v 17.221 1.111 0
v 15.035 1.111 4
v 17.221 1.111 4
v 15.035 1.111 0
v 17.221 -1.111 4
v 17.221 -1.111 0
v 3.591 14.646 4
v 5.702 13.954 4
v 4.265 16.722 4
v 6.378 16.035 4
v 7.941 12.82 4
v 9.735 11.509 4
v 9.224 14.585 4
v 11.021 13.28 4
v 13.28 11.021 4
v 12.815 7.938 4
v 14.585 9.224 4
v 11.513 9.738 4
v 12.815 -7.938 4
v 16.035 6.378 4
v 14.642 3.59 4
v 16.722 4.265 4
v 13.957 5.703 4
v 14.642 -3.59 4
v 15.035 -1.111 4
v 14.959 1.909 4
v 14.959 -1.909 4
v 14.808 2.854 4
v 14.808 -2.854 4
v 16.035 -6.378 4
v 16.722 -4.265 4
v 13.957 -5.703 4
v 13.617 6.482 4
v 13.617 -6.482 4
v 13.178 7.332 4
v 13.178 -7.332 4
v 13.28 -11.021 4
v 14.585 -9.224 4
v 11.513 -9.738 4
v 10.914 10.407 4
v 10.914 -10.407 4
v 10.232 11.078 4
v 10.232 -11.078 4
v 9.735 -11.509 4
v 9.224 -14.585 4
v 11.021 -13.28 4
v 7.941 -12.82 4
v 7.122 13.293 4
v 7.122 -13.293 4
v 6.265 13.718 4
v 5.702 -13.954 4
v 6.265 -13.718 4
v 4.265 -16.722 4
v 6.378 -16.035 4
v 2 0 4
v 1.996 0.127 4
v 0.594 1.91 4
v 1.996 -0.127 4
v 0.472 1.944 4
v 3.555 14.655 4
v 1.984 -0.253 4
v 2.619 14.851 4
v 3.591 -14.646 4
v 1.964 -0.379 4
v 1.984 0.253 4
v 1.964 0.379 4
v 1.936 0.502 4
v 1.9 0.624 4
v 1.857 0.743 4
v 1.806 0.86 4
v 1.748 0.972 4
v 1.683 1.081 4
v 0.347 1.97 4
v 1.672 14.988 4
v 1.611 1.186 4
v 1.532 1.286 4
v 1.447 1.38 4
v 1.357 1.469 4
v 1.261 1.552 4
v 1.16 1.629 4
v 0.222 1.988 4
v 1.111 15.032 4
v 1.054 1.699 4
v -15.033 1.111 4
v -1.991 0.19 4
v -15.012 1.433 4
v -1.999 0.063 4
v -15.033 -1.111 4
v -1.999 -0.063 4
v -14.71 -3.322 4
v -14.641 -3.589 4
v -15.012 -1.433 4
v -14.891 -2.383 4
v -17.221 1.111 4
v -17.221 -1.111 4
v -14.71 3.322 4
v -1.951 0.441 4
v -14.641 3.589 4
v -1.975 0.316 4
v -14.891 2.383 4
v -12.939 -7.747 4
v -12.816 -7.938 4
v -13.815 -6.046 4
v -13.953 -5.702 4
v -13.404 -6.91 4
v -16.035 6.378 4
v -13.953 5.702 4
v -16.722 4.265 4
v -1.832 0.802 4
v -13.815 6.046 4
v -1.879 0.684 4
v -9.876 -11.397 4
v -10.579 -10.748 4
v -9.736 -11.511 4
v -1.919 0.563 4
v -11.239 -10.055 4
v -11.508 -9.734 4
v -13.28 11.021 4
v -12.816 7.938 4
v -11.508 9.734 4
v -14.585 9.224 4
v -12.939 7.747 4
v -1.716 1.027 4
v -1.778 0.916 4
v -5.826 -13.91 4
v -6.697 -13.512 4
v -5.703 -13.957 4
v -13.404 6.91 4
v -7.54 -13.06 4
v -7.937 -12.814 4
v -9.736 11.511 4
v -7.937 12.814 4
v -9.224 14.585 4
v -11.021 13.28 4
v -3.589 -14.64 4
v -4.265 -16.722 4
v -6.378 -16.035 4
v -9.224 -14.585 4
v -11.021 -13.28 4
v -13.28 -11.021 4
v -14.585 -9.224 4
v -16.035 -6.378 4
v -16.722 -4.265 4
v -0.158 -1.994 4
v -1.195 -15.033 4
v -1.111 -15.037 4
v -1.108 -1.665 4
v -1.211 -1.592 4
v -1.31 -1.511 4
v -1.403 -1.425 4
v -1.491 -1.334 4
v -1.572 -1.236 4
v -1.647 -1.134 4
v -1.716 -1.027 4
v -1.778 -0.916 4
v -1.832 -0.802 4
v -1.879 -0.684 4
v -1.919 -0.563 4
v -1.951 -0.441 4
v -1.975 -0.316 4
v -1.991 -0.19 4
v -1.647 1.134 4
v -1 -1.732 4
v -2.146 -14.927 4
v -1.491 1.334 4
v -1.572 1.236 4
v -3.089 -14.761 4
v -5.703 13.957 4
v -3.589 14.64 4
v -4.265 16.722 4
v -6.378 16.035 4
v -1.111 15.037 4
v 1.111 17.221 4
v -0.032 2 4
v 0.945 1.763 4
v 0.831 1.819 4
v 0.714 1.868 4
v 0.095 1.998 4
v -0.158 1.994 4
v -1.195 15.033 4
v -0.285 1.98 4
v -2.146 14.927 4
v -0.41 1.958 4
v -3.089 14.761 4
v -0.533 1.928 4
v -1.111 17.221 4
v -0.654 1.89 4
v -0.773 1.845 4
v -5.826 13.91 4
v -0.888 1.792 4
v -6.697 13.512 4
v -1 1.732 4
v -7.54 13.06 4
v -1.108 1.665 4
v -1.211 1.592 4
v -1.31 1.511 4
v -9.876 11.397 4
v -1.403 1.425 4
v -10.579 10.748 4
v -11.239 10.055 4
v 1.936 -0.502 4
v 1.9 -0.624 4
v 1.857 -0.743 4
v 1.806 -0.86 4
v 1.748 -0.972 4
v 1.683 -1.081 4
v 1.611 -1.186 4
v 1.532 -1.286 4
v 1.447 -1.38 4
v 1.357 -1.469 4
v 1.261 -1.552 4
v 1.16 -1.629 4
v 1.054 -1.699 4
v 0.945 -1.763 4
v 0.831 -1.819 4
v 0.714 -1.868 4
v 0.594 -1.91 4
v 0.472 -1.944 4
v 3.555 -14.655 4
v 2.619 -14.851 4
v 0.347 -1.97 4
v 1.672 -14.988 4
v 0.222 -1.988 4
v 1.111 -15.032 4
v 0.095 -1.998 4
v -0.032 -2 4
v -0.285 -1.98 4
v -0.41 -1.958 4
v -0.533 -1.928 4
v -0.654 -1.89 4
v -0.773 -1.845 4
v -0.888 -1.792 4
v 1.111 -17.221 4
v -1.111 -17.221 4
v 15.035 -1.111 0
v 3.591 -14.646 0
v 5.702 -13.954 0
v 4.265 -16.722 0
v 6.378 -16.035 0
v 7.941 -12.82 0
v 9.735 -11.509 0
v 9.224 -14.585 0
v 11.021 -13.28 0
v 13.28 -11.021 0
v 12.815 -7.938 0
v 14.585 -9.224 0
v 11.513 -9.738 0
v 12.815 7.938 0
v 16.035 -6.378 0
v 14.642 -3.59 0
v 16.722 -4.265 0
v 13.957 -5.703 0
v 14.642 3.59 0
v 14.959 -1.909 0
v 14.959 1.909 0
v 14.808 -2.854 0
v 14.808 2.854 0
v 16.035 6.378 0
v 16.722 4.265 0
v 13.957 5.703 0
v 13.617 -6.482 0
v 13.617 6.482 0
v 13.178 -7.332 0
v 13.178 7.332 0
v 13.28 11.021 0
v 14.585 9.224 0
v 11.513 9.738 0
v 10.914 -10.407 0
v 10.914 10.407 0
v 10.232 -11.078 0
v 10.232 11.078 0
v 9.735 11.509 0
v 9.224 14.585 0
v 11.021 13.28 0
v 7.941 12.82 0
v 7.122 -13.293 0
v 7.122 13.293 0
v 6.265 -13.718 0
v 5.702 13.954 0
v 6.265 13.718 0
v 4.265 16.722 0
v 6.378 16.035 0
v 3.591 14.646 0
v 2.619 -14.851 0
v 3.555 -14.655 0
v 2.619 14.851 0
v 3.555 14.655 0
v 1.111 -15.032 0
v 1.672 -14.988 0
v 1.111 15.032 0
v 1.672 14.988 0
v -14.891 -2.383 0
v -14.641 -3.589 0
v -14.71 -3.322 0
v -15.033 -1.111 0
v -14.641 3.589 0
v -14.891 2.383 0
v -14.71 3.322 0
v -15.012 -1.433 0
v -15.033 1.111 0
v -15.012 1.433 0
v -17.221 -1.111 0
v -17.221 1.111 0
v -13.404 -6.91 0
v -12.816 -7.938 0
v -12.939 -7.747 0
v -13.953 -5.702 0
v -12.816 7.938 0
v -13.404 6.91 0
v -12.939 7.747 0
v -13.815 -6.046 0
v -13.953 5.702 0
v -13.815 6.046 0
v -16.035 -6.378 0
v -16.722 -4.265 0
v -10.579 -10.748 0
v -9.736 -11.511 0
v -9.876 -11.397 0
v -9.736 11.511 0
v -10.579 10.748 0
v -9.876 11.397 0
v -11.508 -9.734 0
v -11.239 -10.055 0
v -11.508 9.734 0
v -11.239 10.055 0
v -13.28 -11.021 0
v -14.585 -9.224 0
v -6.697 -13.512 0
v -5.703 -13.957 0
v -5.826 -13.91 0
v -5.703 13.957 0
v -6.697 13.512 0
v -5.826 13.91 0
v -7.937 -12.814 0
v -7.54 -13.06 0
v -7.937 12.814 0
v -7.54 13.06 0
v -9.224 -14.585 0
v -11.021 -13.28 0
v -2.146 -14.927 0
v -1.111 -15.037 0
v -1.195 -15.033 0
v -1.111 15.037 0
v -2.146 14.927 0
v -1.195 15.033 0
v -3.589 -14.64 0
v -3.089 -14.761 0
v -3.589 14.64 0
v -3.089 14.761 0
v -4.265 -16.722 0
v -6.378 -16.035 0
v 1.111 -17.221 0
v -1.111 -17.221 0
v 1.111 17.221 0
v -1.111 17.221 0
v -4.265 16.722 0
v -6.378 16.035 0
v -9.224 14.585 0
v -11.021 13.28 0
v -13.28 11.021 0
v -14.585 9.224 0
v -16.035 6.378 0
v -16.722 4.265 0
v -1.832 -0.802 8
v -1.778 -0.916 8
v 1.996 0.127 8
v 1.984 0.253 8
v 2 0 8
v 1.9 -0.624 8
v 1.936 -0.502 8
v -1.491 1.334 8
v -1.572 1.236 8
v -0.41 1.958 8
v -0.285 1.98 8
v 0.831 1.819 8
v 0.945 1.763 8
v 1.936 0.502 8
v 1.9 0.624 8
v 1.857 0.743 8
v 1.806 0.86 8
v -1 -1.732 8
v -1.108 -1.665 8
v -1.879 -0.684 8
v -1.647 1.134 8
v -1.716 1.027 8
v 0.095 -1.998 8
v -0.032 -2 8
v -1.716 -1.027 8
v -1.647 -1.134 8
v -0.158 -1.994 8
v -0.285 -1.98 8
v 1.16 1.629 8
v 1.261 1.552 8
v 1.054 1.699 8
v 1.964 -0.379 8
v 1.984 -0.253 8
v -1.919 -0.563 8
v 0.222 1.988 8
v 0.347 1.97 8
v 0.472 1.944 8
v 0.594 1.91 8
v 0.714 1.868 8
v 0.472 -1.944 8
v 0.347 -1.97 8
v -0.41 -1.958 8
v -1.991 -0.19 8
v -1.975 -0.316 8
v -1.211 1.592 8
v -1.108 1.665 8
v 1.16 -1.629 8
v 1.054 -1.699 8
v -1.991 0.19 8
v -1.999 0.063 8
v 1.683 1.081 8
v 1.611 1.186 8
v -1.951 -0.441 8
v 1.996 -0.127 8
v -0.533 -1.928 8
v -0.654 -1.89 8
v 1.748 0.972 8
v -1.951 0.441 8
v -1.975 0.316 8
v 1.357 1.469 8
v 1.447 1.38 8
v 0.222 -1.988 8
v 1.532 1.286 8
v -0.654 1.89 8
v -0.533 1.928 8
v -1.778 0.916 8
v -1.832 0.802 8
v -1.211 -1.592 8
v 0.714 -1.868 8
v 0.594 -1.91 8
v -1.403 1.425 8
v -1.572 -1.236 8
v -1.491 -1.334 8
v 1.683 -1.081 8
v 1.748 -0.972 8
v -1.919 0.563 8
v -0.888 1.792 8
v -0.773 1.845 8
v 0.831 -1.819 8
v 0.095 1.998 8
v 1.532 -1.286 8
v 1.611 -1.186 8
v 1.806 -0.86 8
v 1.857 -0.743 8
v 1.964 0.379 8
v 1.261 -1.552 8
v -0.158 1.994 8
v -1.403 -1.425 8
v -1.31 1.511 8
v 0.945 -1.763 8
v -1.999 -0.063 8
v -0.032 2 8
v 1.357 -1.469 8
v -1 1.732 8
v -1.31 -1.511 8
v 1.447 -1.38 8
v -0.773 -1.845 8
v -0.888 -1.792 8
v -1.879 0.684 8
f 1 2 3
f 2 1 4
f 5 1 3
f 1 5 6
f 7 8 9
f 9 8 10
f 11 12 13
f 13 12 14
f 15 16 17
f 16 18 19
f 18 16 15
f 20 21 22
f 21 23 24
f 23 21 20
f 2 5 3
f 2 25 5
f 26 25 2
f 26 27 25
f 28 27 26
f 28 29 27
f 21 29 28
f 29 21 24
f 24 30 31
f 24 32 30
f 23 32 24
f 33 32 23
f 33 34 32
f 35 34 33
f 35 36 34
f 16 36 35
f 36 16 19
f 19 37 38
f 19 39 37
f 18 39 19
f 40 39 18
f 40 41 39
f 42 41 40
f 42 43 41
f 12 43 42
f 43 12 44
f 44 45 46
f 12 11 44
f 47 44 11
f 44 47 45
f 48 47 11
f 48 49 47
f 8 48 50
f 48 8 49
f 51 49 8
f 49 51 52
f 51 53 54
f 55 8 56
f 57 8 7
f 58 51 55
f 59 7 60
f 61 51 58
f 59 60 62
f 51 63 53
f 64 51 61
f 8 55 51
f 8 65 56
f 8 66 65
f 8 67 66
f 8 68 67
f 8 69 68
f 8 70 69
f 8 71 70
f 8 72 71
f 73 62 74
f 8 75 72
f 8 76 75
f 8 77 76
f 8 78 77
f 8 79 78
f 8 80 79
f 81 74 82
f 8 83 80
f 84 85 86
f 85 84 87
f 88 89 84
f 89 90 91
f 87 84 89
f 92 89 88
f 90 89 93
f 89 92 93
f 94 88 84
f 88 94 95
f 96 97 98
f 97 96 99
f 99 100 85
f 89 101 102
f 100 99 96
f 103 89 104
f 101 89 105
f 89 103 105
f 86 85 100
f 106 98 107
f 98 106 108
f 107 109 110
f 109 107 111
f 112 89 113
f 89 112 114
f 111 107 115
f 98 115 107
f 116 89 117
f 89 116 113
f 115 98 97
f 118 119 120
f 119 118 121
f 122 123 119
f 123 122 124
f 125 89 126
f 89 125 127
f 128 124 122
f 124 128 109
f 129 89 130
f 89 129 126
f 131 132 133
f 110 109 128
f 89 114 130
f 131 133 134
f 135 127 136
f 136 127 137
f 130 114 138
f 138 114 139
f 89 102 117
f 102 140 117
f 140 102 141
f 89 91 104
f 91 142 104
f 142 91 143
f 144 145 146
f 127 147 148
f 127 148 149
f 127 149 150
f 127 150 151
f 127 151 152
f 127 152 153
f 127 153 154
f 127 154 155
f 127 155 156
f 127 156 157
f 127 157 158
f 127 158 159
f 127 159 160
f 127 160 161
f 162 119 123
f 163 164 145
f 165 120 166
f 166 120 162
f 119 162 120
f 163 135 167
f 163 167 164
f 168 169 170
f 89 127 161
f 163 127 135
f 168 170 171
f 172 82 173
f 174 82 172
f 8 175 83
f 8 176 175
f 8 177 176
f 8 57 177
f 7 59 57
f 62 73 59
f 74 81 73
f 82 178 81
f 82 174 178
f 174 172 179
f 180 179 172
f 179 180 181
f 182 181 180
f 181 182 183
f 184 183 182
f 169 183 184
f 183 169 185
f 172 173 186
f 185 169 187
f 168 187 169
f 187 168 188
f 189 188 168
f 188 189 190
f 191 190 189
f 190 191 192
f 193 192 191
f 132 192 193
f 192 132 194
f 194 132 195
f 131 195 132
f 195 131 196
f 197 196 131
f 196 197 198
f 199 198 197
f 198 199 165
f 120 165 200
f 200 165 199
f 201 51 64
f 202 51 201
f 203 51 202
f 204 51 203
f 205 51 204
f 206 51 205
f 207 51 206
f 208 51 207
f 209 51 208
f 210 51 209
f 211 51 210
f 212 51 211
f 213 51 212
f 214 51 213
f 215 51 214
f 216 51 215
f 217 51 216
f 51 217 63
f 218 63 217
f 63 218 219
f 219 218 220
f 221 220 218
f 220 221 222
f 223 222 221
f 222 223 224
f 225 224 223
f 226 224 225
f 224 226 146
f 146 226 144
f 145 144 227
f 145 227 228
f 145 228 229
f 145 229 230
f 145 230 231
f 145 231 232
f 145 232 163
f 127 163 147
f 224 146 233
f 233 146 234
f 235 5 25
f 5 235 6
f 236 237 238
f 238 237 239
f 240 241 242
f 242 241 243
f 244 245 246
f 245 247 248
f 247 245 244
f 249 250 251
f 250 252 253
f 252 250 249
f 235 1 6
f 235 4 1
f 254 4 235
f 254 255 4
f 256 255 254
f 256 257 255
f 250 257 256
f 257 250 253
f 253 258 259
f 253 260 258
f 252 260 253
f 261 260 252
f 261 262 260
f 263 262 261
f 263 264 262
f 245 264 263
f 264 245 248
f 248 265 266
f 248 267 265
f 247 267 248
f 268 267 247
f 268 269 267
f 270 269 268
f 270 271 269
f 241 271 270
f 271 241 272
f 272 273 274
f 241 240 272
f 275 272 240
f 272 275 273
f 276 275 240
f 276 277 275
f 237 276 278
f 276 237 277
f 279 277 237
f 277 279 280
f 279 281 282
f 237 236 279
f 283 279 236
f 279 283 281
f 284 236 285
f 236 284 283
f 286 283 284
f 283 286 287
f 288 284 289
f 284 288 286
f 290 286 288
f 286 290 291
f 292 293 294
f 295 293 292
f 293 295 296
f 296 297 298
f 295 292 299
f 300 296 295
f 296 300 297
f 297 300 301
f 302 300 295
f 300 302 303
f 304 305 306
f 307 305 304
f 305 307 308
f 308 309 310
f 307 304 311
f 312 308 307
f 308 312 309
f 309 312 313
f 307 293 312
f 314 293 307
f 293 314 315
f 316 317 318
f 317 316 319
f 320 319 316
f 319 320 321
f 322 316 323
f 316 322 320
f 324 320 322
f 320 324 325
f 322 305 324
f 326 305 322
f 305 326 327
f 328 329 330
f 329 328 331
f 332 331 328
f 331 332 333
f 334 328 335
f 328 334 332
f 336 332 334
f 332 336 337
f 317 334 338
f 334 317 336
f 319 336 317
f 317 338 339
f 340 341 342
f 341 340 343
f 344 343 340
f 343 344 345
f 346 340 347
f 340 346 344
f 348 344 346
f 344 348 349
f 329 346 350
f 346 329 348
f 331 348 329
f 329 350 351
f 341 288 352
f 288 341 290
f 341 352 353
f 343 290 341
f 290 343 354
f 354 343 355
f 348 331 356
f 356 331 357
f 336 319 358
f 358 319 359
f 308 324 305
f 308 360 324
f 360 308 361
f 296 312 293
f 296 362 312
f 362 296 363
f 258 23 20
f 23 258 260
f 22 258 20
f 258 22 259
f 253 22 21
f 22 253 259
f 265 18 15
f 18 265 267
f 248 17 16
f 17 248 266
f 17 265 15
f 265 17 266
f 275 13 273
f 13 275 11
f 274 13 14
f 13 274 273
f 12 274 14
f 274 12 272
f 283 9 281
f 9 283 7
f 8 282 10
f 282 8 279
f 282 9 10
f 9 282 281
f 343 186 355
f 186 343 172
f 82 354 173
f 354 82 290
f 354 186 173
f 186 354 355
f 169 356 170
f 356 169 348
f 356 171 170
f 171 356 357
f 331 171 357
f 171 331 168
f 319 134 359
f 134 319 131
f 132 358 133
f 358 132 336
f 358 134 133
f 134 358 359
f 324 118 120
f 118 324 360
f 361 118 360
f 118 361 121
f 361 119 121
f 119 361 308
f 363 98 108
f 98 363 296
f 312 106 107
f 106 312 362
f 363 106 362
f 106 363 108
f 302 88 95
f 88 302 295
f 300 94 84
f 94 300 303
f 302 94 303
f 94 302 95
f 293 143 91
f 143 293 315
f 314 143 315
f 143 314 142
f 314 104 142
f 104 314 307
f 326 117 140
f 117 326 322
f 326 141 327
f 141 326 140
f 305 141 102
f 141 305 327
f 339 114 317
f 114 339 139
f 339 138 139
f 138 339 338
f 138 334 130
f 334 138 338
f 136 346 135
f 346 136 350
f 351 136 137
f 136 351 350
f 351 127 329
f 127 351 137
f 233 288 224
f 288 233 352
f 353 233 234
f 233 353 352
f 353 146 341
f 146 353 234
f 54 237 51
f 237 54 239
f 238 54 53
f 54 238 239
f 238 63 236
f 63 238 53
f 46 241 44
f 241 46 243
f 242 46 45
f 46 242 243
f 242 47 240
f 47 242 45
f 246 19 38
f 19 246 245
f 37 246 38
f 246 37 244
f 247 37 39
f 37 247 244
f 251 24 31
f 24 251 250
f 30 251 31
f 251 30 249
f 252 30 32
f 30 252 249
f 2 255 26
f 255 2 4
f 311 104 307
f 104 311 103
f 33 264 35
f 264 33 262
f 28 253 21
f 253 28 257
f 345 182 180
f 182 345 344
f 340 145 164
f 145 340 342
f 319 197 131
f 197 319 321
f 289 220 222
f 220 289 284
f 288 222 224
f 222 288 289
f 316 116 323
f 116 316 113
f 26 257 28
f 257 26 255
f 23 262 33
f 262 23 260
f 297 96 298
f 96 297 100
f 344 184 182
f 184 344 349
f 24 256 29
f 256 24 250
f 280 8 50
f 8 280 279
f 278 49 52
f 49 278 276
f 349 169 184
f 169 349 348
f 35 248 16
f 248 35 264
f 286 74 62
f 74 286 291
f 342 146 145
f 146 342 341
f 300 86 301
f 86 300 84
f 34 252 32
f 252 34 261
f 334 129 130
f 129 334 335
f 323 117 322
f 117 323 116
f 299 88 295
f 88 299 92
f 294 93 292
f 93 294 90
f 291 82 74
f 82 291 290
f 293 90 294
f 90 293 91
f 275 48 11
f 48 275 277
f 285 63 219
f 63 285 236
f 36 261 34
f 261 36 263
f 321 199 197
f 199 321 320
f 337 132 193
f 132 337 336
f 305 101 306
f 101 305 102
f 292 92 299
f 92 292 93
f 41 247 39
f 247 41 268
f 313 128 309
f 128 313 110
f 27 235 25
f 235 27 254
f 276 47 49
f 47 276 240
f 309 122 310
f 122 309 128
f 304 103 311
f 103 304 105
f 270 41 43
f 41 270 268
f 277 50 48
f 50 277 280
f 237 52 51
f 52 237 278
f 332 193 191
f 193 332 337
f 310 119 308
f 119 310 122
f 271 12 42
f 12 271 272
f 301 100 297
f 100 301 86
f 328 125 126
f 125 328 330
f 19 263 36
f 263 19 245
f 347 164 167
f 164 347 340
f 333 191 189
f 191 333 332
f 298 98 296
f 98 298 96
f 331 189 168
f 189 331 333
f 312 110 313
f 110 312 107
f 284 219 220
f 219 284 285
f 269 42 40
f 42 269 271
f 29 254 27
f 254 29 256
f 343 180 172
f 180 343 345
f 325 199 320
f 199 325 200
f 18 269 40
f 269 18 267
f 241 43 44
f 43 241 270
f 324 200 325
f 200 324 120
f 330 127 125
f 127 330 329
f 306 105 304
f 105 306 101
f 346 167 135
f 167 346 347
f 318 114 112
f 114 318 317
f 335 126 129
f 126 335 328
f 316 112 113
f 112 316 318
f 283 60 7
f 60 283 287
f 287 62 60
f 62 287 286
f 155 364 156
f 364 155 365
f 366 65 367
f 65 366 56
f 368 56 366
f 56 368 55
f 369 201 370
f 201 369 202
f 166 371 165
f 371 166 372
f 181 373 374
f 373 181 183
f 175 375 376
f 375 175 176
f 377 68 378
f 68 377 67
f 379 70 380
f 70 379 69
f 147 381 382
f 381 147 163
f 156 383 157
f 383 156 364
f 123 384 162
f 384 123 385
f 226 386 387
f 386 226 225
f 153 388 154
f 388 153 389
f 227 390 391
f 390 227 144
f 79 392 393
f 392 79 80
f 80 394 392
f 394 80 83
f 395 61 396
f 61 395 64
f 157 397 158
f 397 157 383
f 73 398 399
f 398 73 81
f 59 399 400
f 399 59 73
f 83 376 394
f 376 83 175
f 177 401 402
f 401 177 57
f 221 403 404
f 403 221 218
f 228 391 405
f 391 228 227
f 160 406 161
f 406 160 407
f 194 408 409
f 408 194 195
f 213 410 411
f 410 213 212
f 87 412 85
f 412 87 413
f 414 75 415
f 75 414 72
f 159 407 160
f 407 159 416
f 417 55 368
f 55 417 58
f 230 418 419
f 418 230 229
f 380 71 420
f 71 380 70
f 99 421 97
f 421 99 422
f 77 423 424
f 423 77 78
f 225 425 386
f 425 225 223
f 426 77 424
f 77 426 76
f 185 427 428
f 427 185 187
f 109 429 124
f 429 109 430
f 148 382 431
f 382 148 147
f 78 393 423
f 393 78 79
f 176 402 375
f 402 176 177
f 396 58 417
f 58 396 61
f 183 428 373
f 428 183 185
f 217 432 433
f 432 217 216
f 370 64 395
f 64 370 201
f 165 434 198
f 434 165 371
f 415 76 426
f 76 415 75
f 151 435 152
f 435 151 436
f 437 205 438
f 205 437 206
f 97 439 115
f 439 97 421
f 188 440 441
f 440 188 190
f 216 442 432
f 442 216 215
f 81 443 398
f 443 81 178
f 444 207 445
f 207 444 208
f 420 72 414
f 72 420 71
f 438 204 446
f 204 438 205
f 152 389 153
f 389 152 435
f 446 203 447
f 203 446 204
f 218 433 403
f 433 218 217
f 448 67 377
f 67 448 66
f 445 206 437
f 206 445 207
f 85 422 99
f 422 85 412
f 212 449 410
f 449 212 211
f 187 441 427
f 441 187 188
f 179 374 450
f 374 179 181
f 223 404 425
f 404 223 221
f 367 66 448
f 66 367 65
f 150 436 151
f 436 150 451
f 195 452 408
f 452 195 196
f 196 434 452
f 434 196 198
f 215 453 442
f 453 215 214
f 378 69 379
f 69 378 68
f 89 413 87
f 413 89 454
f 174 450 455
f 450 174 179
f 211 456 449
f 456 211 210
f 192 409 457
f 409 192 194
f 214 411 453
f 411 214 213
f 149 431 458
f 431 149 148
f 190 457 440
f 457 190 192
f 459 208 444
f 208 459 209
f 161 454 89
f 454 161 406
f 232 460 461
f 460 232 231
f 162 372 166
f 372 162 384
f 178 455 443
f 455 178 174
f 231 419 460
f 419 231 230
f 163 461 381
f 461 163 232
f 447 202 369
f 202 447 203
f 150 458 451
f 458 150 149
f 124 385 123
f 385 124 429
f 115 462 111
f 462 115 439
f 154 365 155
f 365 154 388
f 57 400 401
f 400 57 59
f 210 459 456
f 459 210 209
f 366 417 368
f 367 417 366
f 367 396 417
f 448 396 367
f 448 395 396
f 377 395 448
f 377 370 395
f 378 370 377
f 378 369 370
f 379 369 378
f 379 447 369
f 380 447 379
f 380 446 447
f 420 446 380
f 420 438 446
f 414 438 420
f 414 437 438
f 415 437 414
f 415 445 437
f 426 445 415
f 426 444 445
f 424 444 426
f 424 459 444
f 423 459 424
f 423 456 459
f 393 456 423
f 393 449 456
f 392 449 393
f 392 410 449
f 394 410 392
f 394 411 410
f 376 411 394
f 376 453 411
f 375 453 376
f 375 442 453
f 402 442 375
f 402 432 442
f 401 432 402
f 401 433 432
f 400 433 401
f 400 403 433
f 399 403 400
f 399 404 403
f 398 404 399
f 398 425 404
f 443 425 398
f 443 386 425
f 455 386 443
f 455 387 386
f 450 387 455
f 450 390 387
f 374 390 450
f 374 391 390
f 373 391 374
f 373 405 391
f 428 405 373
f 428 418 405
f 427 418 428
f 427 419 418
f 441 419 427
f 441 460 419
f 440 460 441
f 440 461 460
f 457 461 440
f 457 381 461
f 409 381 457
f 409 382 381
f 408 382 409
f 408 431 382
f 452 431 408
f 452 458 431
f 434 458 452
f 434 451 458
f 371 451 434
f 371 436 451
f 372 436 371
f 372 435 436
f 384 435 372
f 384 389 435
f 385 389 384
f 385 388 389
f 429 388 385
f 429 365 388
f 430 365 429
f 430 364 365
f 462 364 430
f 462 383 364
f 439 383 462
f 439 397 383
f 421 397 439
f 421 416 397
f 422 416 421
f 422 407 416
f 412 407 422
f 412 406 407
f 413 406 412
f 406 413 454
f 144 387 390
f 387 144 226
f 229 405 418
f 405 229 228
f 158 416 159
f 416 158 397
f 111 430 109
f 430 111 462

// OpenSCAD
Radius = 15;
GearHeight = 4;
Teeth = 30;
ToothSize = (Radius * PI) / Teeth;

module Gear(Size){
for(a = [0 : 360 / (Teeth * Size) * 1.5 : 360-360 / (Teeth
* Size)])
rotate([0, 0, a]) translate([Radius * Size, 0, 0])
scale([2, 1,1])
rotate([0, 0, 45])
cylinder(h = GearHeight, r = ToothSize, $fn = 4);
cylinder(h = GearHeight, r = Radius * Size + ToothSize /
(Teeth * .65), $fn = 99);  
cylinder(h = GearHeight + 4, r = 2, $fn = 99);
} 

Gear(1);
